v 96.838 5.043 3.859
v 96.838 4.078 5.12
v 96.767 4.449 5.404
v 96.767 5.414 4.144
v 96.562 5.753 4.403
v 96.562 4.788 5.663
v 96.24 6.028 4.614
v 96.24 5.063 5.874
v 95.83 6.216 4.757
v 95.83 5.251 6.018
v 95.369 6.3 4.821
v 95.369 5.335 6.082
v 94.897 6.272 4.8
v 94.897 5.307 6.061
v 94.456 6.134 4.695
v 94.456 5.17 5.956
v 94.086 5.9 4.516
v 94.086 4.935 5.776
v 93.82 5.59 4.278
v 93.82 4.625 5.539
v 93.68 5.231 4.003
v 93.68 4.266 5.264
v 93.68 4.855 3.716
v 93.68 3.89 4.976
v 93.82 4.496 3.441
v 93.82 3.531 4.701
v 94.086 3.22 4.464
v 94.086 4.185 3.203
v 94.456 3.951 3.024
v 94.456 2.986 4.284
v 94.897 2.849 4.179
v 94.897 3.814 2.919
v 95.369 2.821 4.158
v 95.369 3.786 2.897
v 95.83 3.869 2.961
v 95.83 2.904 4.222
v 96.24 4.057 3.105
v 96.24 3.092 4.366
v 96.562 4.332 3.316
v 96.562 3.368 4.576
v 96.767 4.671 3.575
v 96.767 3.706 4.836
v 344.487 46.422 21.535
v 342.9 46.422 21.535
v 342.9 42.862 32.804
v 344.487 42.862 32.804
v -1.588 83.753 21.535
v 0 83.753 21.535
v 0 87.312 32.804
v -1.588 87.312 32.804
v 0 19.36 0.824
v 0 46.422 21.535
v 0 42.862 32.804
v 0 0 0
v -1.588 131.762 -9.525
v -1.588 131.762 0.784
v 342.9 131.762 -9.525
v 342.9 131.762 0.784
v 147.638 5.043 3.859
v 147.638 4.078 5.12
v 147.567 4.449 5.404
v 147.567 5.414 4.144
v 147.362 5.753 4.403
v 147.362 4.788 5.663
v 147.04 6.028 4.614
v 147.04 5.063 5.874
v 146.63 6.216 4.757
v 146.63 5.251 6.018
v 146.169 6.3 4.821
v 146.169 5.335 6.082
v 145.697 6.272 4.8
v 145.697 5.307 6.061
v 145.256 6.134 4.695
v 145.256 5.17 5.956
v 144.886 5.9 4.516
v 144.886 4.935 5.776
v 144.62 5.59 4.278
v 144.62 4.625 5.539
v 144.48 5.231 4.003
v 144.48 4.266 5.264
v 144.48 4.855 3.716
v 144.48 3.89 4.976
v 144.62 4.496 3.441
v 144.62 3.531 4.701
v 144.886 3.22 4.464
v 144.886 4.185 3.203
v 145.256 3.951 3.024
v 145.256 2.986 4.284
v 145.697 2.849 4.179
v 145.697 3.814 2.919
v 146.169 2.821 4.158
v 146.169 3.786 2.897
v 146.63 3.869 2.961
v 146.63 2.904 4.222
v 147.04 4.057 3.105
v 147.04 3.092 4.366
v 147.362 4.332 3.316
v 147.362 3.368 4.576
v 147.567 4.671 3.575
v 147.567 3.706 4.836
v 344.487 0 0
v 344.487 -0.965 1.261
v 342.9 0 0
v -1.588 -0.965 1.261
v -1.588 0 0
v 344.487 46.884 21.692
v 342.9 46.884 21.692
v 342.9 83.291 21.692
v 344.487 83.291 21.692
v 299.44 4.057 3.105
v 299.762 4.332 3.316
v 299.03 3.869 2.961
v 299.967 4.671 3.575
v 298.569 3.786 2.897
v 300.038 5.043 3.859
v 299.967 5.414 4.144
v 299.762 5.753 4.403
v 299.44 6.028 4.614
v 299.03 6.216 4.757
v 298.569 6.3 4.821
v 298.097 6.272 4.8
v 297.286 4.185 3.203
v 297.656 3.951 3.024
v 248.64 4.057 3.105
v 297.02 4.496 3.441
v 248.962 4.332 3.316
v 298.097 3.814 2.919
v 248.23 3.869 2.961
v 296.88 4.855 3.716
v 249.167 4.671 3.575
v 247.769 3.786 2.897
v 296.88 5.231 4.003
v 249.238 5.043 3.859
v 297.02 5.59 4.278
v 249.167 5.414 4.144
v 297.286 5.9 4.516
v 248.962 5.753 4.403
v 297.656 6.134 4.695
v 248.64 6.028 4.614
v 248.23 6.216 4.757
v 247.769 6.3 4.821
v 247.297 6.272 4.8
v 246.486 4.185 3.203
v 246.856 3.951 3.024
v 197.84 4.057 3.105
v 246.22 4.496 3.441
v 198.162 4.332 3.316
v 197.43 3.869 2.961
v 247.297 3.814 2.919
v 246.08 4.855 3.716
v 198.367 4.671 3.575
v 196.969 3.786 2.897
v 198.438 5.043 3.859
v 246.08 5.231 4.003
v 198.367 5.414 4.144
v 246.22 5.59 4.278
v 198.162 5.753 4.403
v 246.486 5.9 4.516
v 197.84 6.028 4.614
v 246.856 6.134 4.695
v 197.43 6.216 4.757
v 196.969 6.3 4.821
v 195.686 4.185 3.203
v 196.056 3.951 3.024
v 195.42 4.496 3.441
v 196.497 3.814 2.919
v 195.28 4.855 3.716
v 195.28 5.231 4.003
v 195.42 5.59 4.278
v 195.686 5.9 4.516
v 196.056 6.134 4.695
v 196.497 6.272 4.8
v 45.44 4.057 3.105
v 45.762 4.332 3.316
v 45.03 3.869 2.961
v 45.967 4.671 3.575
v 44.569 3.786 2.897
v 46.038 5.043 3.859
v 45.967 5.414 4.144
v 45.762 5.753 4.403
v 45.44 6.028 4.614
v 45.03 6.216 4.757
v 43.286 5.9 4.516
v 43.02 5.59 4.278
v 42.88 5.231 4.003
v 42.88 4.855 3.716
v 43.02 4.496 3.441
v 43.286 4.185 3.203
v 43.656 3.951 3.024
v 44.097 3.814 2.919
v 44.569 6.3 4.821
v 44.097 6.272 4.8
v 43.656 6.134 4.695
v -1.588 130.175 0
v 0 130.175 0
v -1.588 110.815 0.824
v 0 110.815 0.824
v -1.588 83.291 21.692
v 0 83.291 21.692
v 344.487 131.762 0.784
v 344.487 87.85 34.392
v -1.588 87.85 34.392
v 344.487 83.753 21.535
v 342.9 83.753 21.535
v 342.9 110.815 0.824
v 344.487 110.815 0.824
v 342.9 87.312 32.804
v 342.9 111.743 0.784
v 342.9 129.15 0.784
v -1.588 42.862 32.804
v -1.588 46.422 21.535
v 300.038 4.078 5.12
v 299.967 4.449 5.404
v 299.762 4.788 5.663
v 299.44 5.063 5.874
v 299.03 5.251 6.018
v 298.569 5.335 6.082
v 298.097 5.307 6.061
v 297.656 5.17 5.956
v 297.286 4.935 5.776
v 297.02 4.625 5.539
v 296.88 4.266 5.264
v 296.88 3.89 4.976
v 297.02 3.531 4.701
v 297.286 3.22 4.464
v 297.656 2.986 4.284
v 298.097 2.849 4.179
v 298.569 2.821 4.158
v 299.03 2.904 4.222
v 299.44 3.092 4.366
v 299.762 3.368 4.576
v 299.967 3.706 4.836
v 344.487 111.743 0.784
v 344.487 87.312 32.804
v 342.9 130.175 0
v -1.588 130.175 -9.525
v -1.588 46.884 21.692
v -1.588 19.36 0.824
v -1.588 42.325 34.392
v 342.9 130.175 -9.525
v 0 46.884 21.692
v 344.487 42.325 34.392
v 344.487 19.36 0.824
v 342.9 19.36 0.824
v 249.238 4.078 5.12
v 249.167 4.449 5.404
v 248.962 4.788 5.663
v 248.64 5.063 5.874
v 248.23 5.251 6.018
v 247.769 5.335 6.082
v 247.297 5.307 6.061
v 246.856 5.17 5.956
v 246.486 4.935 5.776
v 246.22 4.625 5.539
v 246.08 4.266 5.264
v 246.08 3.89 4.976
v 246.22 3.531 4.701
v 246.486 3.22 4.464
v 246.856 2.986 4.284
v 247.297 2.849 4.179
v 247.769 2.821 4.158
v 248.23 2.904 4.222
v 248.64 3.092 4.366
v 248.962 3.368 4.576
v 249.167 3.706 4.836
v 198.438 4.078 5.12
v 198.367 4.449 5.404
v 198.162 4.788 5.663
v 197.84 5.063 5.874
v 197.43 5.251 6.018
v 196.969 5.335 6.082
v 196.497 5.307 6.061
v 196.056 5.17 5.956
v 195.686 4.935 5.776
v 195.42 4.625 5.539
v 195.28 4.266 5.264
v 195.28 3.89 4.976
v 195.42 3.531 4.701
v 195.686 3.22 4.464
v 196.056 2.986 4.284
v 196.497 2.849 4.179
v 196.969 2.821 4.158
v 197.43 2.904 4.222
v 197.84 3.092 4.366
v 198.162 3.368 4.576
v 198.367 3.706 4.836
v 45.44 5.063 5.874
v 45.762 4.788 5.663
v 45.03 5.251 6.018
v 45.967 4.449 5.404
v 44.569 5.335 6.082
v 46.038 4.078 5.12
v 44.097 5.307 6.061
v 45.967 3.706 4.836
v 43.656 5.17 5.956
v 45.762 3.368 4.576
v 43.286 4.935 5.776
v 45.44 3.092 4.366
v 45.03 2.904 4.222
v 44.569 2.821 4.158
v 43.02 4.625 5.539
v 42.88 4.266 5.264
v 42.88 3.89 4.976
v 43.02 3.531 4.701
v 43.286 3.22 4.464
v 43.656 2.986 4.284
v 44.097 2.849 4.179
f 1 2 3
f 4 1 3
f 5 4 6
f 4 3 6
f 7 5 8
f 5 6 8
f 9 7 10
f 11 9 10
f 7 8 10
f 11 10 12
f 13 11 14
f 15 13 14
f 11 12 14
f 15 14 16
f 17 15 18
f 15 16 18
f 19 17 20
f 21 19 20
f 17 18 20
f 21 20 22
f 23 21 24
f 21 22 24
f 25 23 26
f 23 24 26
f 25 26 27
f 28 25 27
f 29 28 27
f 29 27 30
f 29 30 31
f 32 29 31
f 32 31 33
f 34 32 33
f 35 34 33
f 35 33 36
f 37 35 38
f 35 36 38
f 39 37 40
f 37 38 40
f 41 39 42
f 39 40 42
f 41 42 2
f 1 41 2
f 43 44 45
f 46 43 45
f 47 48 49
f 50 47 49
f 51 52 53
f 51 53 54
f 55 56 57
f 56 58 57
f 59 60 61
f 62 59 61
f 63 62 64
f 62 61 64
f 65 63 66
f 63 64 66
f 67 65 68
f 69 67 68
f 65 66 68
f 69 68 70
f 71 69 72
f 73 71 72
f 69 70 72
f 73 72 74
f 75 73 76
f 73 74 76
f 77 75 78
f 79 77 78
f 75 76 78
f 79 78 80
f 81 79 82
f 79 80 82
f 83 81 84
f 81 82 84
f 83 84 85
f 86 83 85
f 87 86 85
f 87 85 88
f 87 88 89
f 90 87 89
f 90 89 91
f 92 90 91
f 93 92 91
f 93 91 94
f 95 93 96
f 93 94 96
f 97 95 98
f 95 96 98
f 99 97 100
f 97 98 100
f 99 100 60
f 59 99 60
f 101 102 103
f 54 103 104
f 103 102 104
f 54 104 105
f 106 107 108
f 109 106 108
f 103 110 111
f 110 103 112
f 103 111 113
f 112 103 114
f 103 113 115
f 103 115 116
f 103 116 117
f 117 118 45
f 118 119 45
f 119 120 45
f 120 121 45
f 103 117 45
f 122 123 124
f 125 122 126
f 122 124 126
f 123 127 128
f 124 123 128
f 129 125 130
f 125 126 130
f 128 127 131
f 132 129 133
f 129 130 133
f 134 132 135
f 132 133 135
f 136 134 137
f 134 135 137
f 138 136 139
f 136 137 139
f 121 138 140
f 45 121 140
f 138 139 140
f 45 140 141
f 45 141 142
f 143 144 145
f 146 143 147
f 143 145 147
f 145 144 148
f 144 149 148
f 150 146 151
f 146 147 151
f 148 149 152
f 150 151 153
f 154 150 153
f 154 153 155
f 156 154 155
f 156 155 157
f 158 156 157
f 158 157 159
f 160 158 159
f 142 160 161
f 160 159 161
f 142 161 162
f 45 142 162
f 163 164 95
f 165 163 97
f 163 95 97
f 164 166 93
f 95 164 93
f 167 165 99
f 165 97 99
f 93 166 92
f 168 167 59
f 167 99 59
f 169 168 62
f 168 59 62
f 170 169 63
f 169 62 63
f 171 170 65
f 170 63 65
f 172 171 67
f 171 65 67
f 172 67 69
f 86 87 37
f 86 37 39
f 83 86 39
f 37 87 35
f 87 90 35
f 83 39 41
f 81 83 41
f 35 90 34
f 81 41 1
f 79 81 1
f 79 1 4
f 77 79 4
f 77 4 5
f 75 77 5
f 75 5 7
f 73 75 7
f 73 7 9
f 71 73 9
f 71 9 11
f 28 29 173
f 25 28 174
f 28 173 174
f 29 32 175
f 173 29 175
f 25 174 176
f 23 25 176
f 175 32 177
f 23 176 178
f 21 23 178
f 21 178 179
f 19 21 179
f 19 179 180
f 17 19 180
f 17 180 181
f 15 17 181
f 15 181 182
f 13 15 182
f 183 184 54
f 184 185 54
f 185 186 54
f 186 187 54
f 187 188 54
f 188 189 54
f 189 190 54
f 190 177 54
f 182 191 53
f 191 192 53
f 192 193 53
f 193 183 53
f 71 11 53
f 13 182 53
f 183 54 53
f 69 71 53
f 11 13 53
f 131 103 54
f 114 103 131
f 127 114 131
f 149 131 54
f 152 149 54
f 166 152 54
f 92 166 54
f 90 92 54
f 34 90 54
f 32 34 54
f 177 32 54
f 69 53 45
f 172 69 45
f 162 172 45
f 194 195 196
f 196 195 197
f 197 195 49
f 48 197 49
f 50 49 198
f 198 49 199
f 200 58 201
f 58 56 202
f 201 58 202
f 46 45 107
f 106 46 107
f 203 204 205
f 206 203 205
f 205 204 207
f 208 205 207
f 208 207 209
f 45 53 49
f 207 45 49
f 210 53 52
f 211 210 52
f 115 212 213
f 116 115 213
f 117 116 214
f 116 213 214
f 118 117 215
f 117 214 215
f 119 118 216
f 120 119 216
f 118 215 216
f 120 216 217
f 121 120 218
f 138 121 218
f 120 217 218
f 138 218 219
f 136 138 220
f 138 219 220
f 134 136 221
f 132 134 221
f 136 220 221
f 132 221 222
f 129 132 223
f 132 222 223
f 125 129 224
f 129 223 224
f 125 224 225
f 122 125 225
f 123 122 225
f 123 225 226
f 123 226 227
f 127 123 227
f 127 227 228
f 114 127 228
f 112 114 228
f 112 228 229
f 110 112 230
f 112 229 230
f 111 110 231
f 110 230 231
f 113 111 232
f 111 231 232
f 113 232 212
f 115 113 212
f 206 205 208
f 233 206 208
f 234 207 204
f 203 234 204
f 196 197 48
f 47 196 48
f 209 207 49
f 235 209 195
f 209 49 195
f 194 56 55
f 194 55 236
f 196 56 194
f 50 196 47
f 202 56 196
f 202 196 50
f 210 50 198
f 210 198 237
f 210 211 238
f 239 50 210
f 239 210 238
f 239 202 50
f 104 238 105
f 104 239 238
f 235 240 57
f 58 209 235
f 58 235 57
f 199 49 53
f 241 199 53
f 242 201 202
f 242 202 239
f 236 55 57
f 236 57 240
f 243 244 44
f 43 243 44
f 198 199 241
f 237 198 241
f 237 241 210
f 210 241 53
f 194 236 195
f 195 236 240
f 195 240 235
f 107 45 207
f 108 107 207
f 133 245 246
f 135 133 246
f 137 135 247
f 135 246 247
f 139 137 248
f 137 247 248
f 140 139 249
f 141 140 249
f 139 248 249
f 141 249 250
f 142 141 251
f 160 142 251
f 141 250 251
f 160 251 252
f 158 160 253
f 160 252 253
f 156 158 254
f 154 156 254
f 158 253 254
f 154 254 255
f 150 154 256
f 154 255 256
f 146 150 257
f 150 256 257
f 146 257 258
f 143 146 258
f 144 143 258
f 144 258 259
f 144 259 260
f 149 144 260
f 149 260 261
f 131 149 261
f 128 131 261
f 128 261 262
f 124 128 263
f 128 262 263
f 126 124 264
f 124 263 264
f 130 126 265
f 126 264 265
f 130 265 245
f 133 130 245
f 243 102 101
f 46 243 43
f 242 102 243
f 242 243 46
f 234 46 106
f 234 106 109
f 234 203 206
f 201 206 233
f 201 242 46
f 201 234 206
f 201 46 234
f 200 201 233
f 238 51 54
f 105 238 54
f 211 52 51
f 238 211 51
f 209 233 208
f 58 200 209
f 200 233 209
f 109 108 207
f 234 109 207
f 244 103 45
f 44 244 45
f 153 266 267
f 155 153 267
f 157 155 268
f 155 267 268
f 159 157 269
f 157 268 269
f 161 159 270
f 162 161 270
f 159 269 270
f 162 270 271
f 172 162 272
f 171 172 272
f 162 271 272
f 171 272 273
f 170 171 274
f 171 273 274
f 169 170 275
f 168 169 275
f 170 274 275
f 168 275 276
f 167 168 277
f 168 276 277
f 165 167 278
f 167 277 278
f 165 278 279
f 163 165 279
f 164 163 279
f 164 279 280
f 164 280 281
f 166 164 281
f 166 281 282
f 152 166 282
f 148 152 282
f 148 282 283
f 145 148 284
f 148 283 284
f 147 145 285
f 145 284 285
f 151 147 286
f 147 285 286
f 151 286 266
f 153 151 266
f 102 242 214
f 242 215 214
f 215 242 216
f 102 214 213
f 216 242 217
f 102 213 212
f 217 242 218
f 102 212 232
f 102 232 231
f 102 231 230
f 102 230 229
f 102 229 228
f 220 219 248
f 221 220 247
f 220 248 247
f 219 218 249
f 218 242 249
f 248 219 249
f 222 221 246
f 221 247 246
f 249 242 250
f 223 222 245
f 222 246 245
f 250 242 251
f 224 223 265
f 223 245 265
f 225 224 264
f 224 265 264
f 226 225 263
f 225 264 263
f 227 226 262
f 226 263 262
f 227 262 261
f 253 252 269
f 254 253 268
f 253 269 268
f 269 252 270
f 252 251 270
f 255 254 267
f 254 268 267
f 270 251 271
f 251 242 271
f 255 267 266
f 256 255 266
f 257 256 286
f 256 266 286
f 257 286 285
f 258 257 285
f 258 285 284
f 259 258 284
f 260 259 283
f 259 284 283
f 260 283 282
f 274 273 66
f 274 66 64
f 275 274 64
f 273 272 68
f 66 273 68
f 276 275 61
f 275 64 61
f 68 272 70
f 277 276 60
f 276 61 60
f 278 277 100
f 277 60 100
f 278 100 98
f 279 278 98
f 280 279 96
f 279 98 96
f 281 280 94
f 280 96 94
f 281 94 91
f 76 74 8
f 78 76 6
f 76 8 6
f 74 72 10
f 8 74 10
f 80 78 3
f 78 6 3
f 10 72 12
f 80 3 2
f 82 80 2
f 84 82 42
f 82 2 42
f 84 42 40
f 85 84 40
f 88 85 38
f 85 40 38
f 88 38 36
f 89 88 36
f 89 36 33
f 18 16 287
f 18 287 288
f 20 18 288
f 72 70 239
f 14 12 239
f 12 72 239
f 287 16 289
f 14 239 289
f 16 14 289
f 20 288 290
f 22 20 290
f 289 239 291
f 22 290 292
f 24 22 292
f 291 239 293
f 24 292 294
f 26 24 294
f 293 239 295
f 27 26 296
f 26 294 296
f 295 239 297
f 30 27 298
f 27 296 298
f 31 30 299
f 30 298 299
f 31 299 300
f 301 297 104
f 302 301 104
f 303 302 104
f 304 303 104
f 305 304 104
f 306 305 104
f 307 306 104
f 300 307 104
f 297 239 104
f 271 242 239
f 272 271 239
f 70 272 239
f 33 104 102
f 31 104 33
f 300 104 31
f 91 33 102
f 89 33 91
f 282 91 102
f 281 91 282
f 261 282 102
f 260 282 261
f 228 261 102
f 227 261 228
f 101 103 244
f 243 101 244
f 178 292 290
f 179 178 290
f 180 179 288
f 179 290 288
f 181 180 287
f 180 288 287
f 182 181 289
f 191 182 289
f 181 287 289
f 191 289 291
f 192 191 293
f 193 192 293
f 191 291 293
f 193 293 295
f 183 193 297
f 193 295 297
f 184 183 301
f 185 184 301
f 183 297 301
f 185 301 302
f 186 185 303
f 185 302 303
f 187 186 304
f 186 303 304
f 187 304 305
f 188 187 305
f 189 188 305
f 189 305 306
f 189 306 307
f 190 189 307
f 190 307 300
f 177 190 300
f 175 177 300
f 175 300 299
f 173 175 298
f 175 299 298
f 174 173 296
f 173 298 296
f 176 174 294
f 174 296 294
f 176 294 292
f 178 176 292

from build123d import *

# Parameters (mm, degrees)
F1_DEPTH  = 342.9
F3_DEPTH  = 1.5875
F4_W      = 1.5875
F4_H      = 10.3091086821
F5_DEPTH  = 25.4
F7_DEPTH  = 1.5875
F9_R      = 1.5875
F10_DEPTH = 1.5875


with BuildPart() as f1:
    # F0 (on Right) → F1 (new body)
    with BuildSketch(Plane.YZ):
        Polygon((-0.9648254583, 1.2606617647), (0, 0), (42.8625, 32.8040655826), (87.3125, 32.8040655826), (130.175, 0), (130.175, -9.525), (131.7625, -9.525), (131.7625, 0.7841086821), (87.8502715669, 34.3915655826), (42.3247284331, 34.3915655826), align=None)
    extrude(amount=F1_DEPTH)

    # F6 (on face) → F7 (join)
    with BuildSketch(Plane(origin=(0, 0, 0), x_dir=(0, -1, 0), z_dir=(-1, 0, 0))):
        Polygon((-130.175, 0), (-110.8146041448, 0.8236222302), (-83.7526464353, 21.5350188005), (-87.3125, 32.8040655826), align=None)
        Polygon((-42.8625, 32.8040655826), (-87.3125, 32.8040655826), (-83.2905208193, 21.6915655826), (-46.8844791807, 21.6915655826), align=None)
        Polygon((0, 0), (-42.8625, 32.8040655826), (-46.4223535647, 21.5350188005), (-19.3603958552, 0.8236222302), align=None)
        Polygon((-130.175, -9.525), (-130.175, 0), (-87.3125, 32.8040655826), (-42.8625, 32.8040655826), (0, 0), (0.9648254583, 1.2606617647), (-42.3247284331, 34.3915655826), (-87.8502715669, 34.3915655826), (-131.7625, 0.7841086821), (-131.7625, -9.525), align=None)
    extrude(amount=F7_DEPTH)


with BuildPart() as f3:
    # F2 (on face) → F3 (new body)
    with BuildSketch(Plane.YZ.offset(342.9)):
        Polygon((0, 0), (19.3603958552, 0.8236222302), (46.4223535647, 21.5350188005), (42.8625, 32.8040655826), align=None)
        Polygon((87.3125, 32.8040655826), (42.8625, 32.8040655826), (46.8844791807, 21.6915655826), (83.2905208193, 21.6915655826), align=None)
        Polygon((130.175, 0), (87.3125, 32.8040655826), (83.7526464353, 21.5350188005), (110.8146041448, 0.8236222302), align=None)
        Polygon((-0.9648254583, 1.2606617647), (0, 0), (42.8625, 32.8040655826), (87.3125, 32.8040655826), (130.175, 0), (130.175, -9.525), (131.7625, -9.525), (131.7625, 0.7841086821), (87.8502715669, 34.3915655826), (42.3247284331, 34.3915655826), align=None)
    extrude(amount=F3_DEPTH)

    # F4 (on face) → F5 (cut)
    with BuildSketch(Plane(origin=(0, 131.7625, 0), x_dir=(-1, 0, 0), z_dir=(0, 1, 0))):
        with Locations((-343.69375, -4.3704456589)):
            Rectangle(F4_W, F4_H)
    extrude(amount=-F5_DEPTH, mode=Mode.SUBTRACT)


with BuildPart() as f1_1:
    add(f1.part)

    # F8: union F3
    add(f3.part)

    # F9 (on face) → F10 (cut, through all)
    with BuildSketch(Plane(origin=(0, -0.9648254583, 1.2606617647), x_dir=(1, 0, 0), z_dir=(0, -0.6077640682, 0.7941176471))):
        with Locations((44.4500253916, 6.35)):
            Circle(F9_R)
        with Locations((95.2500253916, 6.35)):
            Circle(F9_R)
        with Locations((146.0500253916, 6.35)):
            Circle(F9_R)
        with Locations((196.8500253916, 6.35)):
            Circle(F9_R)
        with Locations((247.6500253916, 6.35)):
            Circle(F9_R)
        with Locations((298.4500253916, 6.35)):
            Circle(F9_R)
    extrude(amount=-F10_DEPTH, mode=Mode.SUBTRACT)


solid = f1_1.part
